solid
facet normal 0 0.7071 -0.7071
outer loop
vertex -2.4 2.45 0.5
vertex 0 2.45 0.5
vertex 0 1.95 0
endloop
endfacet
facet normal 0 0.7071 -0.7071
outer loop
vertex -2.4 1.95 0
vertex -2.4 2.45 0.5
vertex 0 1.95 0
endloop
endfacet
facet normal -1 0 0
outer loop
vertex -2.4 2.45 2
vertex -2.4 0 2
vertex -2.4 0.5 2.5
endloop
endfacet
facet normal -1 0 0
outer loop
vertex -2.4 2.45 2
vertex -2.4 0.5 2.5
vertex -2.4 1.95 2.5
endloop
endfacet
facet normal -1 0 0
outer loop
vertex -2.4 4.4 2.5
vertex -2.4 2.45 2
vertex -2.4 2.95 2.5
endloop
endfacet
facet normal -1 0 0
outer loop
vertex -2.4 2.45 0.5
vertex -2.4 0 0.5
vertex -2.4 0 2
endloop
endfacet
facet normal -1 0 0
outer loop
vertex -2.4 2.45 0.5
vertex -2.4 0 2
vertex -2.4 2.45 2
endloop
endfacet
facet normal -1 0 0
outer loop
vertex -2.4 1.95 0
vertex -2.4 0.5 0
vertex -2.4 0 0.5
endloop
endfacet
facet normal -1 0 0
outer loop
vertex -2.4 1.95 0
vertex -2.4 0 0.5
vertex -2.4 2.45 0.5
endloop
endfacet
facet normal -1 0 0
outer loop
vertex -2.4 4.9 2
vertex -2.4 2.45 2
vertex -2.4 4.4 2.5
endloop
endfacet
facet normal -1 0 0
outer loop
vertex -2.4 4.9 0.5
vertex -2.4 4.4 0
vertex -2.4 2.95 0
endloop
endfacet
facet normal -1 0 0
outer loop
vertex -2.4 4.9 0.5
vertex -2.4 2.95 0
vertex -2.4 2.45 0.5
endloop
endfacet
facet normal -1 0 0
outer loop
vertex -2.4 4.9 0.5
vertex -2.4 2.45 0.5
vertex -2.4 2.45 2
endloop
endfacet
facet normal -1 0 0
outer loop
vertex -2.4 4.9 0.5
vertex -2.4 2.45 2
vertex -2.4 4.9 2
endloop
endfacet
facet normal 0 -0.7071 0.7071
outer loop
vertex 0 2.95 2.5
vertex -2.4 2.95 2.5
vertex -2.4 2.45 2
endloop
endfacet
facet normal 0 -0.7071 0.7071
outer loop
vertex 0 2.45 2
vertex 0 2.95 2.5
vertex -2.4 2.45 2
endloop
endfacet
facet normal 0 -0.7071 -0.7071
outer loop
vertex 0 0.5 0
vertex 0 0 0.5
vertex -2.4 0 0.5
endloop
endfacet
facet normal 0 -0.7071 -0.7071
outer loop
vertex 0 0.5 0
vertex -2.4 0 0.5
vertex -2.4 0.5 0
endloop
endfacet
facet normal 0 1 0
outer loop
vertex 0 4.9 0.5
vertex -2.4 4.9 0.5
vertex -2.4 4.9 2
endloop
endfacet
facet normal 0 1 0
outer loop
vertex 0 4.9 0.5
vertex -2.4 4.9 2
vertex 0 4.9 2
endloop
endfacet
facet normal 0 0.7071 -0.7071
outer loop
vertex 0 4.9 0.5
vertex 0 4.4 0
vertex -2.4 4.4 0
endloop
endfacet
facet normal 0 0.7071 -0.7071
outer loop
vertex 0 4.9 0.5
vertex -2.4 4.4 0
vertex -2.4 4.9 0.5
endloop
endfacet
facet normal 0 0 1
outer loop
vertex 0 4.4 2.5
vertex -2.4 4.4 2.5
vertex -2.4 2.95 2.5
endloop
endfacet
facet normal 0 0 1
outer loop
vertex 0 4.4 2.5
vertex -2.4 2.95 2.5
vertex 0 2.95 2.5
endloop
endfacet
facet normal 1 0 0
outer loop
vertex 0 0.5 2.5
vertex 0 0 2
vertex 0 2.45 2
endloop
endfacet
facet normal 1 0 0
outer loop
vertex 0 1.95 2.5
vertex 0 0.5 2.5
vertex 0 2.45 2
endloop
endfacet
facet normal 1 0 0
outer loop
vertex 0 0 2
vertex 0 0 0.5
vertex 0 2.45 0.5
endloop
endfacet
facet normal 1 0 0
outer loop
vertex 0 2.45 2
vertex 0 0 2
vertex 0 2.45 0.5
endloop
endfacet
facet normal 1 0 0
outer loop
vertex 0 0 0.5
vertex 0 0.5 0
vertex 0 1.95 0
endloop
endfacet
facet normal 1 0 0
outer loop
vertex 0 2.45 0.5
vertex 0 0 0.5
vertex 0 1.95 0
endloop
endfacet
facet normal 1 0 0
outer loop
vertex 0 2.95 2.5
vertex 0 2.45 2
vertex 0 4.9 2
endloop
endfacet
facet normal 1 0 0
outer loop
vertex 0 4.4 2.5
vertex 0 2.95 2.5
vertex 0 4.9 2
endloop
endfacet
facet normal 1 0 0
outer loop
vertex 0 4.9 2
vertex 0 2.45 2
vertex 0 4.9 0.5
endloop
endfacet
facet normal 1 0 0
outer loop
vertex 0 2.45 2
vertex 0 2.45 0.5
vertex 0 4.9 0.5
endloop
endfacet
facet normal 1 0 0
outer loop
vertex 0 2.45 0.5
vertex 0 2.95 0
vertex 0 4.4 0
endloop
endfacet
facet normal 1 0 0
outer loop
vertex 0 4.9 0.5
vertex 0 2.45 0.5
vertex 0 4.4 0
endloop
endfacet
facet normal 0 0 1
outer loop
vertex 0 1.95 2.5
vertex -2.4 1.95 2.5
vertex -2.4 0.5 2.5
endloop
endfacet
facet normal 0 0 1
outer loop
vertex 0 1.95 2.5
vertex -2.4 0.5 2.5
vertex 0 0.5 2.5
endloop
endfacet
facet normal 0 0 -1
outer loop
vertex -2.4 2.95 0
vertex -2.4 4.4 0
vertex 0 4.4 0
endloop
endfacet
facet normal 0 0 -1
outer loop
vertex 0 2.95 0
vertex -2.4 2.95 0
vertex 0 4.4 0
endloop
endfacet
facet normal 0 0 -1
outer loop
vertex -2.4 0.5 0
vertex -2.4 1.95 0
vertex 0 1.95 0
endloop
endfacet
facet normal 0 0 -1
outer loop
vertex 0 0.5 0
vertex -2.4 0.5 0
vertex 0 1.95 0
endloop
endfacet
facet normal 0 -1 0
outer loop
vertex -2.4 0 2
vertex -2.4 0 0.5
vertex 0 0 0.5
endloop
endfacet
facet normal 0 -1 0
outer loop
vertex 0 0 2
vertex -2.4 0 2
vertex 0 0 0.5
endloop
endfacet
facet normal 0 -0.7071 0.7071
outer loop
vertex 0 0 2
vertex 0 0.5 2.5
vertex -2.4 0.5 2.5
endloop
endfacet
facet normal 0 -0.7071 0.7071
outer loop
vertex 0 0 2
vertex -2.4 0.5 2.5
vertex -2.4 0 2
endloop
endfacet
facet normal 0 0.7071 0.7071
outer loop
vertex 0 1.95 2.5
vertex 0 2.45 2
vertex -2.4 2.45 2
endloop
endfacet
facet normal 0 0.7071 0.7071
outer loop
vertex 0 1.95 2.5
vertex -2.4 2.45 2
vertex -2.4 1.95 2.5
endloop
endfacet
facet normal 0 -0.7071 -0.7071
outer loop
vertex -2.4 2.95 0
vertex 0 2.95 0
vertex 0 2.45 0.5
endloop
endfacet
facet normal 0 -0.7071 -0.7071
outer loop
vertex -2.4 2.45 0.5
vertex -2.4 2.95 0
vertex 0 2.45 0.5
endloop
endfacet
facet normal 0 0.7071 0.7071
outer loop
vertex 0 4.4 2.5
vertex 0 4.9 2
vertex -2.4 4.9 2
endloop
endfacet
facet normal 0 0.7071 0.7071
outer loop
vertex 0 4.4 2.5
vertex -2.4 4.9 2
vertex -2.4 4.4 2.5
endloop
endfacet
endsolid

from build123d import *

# Parameters (mm, degrees)
SKICA1_W                 = 2.4
SKICA1_H                 = 4.9
P_IDAT_VYSUNUT_M1_DEPTH  = 2.5
ODEBRAT_VYSUNUT_M1_DEPTH = 2.5


with BuildPart() as part:
    # Skica1 → Přidat vysunutím1 (new body)
    with BuildSketch(Plane.XY):
        with Locations((-1.2, 2.45)):
            Rectangle(SKICA1_W, SKICA1_H)
    extrude(amount=P_IDAT_VYSUNUT_M1_DEPTH)

    # Skica3 → Odebrat vysunutím1 (cut)
    with BuildSketch(Plane(origin=(0, 0, 0), x_dir=(0, 0, -1), z_dir=(1, 0, 0))):
        Polygon((-2.5, 2.95), (-2, 2.45), (-2.5, 1.95), align=None)
        Polygon((0, 2.95), (-0.5, 2.45), (0, 1.95), align=None)
        Polygon((-2, 4.9), (-2.5, 4.4), (-2.5, 4.9), align=None)
        Polygon((-2.5, 0.5), (-2, 0), (-2.5, 0), align=None)
        Polygon((-0.5, 0), (0, 0.5), (0, 0), align=None)
        Polygon((0, 4.9), (0, 4.4), (-0.5, 4.9), align=None)
    extrude(amount=-ODEBRAT_VYSUNUT_M1_DEPTH, mode=Mode.SUBTRACT)


solid = part.part
